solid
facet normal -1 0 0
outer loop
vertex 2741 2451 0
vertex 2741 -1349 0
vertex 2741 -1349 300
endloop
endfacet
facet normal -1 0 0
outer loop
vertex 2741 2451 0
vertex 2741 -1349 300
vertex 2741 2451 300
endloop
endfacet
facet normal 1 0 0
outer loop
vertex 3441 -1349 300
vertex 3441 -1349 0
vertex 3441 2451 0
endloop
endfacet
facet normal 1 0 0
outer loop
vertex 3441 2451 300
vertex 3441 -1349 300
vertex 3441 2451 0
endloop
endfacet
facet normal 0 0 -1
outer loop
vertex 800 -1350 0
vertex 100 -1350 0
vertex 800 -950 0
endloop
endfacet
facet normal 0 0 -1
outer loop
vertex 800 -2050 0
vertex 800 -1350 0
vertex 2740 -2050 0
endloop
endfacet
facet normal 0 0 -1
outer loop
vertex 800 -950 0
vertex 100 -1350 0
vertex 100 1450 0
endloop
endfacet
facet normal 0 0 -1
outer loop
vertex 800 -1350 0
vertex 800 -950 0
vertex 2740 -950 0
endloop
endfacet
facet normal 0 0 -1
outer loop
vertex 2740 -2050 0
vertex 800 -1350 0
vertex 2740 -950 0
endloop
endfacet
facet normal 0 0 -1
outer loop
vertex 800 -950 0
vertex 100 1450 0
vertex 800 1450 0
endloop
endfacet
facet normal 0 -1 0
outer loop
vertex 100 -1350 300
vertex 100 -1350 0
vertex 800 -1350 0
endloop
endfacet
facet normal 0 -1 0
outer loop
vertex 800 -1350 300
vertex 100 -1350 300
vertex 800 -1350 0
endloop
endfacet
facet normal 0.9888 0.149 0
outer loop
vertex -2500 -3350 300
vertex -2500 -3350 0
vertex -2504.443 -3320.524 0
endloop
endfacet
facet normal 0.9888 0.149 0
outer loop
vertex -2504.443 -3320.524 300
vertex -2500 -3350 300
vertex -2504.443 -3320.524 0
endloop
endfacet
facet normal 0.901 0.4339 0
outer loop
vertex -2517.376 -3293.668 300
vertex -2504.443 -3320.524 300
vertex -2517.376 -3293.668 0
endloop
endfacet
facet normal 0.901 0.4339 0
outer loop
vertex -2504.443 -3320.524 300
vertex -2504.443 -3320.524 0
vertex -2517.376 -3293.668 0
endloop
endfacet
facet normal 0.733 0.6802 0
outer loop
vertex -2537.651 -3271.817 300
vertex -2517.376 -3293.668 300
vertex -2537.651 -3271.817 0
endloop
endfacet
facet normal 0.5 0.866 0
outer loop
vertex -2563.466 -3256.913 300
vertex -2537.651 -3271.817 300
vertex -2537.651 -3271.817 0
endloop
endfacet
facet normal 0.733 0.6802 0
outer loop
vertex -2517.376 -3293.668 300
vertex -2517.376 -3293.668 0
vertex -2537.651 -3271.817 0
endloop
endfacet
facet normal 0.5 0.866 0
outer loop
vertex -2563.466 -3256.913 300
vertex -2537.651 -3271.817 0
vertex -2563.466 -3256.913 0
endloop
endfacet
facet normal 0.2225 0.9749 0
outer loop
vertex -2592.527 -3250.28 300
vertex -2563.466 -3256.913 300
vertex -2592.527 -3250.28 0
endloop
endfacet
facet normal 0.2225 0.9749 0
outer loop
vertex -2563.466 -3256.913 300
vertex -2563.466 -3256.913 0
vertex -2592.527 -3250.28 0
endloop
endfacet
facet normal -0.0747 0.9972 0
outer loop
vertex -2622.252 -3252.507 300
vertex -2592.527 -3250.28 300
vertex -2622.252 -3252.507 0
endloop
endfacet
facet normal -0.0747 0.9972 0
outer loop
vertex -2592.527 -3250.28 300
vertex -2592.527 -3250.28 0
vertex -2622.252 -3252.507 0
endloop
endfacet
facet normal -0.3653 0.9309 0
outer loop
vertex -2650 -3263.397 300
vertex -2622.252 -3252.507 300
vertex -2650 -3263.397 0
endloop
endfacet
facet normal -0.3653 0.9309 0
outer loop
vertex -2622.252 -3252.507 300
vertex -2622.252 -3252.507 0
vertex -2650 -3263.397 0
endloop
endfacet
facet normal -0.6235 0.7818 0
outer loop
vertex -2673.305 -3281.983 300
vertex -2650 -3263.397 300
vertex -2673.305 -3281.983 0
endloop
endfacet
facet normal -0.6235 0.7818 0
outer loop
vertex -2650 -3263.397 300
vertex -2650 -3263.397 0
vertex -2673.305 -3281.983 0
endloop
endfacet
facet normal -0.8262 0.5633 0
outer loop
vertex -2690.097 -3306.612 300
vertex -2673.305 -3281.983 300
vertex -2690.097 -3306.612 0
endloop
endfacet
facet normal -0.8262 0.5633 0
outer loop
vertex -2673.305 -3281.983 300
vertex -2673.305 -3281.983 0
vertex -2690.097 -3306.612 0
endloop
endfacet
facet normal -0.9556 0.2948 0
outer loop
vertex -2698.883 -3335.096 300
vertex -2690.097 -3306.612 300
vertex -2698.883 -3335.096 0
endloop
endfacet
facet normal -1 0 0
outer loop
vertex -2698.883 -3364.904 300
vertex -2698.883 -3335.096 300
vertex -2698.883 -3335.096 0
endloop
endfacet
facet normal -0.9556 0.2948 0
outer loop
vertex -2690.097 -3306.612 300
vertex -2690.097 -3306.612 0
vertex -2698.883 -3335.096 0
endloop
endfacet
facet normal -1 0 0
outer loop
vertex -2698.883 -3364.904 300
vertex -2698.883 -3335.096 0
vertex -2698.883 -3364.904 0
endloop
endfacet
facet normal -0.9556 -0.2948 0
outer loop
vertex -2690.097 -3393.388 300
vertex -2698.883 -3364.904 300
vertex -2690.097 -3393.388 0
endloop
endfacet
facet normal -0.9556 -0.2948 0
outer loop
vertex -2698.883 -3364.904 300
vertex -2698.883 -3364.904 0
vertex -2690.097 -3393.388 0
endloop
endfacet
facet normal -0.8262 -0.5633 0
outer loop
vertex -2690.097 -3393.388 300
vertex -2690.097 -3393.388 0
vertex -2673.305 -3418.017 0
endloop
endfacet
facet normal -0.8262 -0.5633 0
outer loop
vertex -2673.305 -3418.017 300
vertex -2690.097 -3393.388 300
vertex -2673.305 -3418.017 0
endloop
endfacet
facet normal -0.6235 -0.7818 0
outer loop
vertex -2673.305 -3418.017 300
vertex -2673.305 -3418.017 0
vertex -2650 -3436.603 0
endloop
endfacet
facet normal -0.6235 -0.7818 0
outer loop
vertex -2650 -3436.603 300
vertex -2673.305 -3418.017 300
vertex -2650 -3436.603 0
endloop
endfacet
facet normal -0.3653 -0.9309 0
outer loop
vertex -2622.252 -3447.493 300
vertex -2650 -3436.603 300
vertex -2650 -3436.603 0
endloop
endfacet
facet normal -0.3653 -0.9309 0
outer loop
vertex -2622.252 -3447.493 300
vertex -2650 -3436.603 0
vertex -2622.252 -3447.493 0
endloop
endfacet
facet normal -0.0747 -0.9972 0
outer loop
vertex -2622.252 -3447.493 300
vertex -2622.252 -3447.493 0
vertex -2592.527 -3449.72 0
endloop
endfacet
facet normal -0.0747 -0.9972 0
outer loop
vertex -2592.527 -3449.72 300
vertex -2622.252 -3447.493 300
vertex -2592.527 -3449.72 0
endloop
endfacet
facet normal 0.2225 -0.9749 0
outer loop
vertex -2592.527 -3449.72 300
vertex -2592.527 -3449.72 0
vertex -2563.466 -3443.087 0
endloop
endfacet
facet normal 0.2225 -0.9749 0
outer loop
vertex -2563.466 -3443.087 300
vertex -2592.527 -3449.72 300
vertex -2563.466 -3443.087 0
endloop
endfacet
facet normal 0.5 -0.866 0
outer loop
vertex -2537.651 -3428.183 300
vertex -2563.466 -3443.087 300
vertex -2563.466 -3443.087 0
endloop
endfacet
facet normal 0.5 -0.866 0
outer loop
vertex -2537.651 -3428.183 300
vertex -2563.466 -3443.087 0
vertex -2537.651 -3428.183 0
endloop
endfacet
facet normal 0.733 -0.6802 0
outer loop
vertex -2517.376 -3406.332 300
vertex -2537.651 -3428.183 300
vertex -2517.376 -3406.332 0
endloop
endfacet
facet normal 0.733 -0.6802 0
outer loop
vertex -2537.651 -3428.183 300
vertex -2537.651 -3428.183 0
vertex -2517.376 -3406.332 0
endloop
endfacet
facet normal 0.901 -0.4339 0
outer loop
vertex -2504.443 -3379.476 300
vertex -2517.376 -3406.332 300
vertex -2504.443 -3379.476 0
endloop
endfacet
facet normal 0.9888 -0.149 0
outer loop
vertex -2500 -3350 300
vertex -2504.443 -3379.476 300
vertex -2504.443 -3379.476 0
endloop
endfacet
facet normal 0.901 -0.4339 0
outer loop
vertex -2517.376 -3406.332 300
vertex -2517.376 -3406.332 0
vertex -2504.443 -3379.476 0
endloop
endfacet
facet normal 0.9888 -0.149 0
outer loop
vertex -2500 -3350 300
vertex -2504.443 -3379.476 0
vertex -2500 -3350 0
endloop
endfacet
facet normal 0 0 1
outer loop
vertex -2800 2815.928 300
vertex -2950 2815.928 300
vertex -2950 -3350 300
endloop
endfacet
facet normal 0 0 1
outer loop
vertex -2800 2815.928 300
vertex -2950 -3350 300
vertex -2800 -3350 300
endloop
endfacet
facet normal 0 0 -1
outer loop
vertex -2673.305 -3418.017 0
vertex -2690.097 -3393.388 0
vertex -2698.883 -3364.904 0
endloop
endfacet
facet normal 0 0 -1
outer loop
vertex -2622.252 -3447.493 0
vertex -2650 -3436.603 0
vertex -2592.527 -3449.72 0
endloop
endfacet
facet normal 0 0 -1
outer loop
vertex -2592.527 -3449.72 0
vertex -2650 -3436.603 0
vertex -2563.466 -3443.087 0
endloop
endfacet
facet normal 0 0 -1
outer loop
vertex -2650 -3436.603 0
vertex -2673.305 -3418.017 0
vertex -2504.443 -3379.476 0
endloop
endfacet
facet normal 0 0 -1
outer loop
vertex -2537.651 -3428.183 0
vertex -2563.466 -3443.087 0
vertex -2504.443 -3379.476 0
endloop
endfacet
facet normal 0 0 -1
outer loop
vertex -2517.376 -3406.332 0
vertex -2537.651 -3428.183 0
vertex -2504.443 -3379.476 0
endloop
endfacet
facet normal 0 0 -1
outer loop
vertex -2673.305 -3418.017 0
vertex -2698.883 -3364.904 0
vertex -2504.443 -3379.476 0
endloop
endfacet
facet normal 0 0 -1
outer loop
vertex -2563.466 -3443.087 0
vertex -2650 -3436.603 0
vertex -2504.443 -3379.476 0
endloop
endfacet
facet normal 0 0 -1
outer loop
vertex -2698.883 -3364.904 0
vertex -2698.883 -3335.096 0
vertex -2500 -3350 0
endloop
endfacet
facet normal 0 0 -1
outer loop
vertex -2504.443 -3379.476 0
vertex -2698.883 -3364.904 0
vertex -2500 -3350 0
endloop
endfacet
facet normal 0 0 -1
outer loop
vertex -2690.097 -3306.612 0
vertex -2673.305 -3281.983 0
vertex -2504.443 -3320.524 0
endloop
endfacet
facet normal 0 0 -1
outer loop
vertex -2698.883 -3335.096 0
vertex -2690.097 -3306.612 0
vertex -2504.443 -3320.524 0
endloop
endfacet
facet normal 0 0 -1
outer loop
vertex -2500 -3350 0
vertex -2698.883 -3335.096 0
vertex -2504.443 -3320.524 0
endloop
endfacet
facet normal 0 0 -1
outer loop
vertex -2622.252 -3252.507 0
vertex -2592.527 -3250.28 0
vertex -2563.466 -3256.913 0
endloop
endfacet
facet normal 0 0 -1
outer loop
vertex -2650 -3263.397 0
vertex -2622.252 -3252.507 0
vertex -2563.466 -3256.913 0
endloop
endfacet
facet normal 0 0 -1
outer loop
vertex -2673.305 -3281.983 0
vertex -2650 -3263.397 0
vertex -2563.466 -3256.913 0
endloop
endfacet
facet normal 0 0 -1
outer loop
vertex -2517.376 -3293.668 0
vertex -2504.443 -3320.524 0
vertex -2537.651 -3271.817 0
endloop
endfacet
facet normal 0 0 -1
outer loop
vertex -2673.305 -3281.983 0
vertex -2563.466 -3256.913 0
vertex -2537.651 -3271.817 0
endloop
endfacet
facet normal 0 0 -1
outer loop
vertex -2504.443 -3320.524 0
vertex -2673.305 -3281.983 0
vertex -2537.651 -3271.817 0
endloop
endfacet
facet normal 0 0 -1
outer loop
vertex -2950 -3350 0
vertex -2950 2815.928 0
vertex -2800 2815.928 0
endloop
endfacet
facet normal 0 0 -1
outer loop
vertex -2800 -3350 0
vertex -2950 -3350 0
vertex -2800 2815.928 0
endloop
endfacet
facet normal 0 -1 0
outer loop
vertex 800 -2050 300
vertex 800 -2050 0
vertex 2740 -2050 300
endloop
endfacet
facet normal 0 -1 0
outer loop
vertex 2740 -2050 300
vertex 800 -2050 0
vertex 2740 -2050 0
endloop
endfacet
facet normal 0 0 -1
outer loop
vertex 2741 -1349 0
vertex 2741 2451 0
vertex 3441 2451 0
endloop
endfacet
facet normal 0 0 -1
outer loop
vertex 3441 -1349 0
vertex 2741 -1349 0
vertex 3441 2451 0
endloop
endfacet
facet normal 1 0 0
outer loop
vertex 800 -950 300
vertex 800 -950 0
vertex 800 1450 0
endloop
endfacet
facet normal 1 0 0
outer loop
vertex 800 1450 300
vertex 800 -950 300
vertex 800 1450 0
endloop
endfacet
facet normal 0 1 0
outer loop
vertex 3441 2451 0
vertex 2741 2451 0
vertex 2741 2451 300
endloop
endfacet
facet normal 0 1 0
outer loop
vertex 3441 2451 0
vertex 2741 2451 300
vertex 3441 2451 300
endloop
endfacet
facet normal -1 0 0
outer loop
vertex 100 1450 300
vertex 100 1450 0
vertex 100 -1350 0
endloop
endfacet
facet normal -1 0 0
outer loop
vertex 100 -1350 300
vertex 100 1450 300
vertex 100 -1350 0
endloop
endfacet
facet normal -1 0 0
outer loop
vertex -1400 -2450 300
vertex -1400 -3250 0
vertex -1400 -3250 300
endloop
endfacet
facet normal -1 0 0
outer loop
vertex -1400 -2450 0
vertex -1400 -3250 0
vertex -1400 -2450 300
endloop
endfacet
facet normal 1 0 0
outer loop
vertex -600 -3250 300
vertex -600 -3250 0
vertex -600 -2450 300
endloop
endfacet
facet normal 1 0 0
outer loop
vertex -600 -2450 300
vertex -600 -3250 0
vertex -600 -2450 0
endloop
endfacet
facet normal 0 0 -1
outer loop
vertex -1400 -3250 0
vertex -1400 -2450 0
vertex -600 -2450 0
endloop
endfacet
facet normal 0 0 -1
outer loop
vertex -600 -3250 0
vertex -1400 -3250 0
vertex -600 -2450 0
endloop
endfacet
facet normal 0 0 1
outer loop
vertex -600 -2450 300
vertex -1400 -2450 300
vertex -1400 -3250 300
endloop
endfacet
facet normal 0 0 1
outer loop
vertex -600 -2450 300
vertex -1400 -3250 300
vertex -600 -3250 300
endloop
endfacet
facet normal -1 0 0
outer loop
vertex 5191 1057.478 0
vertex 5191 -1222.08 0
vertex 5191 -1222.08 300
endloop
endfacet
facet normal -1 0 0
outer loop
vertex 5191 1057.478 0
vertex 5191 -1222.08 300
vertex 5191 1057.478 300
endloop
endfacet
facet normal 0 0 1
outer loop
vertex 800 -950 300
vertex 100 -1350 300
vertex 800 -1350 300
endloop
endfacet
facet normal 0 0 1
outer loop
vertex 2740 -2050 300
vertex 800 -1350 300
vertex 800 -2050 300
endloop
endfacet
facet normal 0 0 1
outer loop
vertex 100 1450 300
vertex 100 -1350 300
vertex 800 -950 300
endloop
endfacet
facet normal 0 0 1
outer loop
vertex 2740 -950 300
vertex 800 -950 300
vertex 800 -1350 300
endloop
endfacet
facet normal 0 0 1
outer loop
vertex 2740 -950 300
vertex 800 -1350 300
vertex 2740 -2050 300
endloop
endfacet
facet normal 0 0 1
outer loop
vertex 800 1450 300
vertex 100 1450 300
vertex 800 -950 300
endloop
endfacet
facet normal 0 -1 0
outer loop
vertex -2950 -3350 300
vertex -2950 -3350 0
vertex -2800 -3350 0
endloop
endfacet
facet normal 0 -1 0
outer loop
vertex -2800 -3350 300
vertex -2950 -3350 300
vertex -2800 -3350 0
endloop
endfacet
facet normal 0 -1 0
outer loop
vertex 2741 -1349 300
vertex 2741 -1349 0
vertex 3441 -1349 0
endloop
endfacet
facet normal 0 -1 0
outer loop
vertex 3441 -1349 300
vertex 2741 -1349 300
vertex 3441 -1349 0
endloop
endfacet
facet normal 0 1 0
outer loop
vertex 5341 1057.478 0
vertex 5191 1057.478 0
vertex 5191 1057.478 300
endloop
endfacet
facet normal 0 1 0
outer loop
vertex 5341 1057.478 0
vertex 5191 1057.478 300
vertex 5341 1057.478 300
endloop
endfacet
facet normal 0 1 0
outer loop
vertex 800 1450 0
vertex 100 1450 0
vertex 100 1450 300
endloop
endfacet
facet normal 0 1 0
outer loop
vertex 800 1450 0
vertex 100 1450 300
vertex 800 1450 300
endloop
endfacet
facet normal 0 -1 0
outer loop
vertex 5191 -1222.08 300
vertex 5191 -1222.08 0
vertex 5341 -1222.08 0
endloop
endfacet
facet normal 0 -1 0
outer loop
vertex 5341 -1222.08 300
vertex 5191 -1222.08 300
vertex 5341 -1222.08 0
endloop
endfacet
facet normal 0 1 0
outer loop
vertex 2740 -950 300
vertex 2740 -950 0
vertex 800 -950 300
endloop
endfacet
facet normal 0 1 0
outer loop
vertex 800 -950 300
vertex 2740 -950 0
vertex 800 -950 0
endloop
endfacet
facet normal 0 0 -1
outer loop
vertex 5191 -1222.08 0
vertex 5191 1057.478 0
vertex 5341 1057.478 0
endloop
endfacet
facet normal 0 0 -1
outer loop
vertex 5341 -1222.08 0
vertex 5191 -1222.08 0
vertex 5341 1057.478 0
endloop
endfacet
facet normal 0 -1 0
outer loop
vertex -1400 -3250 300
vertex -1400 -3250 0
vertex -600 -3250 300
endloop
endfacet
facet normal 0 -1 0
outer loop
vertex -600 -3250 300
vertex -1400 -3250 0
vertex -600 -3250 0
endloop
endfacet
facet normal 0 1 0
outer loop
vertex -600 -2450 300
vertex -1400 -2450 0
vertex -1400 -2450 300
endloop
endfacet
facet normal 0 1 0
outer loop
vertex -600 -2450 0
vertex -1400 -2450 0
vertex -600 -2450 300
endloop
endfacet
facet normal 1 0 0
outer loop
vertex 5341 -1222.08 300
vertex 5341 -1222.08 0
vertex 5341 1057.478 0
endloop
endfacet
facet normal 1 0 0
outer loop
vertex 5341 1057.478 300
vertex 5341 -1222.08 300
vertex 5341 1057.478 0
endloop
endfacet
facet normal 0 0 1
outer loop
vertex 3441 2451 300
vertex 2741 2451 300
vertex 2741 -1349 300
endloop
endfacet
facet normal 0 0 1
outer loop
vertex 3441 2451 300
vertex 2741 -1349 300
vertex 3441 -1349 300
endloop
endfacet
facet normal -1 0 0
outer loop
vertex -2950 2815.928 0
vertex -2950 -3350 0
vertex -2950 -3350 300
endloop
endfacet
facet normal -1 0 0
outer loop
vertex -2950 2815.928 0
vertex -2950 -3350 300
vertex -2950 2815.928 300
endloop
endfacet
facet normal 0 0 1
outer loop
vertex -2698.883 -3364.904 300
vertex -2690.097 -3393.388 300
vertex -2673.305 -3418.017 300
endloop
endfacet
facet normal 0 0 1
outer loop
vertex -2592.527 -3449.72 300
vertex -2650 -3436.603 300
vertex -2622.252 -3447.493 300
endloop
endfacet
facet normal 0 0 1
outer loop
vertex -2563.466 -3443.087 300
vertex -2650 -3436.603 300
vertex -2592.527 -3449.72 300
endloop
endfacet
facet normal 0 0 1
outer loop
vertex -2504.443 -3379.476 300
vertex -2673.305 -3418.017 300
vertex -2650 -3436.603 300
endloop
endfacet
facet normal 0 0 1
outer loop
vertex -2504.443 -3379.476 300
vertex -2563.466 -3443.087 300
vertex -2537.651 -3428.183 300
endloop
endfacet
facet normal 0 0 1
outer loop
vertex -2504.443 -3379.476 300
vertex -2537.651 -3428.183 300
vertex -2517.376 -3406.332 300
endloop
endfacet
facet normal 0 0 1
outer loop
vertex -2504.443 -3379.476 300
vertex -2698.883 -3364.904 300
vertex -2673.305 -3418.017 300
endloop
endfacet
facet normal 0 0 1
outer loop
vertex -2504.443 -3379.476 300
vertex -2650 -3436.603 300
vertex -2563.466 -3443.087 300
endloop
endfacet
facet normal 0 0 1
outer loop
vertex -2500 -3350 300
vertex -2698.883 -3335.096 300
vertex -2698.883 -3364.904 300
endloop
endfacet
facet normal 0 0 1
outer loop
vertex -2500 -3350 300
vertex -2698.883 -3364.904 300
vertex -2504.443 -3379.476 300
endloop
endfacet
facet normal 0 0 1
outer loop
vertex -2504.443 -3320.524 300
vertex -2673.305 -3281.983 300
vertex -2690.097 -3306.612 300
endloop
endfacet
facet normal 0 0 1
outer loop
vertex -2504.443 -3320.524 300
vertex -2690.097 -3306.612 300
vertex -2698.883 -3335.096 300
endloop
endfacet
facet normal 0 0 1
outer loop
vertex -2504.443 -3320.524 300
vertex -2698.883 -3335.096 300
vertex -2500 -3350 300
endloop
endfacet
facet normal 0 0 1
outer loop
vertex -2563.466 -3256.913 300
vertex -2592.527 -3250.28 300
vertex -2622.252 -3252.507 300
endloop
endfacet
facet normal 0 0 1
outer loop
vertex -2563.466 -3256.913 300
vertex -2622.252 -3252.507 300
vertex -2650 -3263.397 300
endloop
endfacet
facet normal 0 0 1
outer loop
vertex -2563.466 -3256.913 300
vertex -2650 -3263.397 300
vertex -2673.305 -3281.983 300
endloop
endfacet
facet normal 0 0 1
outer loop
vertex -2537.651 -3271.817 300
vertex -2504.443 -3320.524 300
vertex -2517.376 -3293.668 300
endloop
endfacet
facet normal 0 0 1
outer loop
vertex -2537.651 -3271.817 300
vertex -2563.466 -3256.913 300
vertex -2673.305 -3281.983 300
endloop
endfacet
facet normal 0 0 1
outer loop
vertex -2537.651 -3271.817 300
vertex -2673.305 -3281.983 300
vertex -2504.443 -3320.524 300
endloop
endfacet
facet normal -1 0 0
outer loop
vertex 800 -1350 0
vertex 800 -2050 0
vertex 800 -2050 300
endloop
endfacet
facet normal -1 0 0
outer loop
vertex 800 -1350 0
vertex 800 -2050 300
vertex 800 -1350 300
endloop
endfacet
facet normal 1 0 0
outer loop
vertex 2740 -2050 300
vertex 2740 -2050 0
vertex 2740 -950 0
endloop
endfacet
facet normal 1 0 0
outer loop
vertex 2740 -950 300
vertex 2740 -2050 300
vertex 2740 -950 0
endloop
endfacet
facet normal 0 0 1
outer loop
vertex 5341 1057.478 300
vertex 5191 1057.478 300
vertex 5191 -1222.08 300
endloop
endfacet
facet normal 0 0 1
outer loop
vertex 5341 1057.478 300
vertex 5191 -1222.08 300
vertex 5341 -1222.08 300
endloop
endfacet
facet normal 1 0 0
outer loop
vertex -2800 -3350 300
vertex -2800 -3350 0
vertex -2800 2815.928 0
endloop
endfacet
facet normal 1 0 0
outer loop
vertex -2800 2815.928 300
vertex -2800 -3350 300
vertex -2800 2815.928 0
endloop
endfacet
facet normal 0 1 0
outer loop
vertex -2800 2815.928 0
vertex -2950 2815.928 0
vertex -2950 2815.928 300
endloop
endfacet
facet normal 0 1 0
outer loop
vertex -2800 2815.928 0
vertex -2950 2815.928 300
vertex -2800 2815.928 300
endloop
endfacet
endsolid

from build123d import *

# Parameters (mm, degrees)
F0_W     = 1940
F0_H     = 400
F0_W_2   = 700
F0_H_2   = 2400
F0_H_3   = 700
F0_W_3   = 150
F0_H_4   = 2279.557943
F0_W_4   = 800
F0_H_5   = 800
F0_R     = 100
F0_H_6   = 6165.928221
F0_H_7   = 3800
F1_DEPTH = 300


with BuildPart() as f1:
    # F0 (on Top) → F1 (new body)
    with BuildSketch(Plane.XY):
        with Locations((1770, -1150)):
            Rectangle(F0_W, F0_H)
        with Locations((450, -1150)):
            Rectangle(F0_W_2, F0_H)
        with Locations((450, 250)):
            Rectangle(F0_W_2, F0_H_2)
        with Locations((1770, -1700)):
            Rectangle(F0_W, F0_H_3)
        with Locations((5266, -82.301021)):
            Rectangle(F0_W_3, F0_H_4)
        with Locations((-1000, -2850)):
            Rectangle(F0_W_4, F0_H_5)
        with Locations((-2600, -3350)):
            Circle(F0_R)
        with Locations((-2875, -267.03589)):
            Rectangle(F0_W_3, F0_H_6)
        with Locations((3091, 551)):
            Rectangle(F0_W_2, F0_H_7)
    extrude(amount=F1_DEPTH)


solid = f1.part
